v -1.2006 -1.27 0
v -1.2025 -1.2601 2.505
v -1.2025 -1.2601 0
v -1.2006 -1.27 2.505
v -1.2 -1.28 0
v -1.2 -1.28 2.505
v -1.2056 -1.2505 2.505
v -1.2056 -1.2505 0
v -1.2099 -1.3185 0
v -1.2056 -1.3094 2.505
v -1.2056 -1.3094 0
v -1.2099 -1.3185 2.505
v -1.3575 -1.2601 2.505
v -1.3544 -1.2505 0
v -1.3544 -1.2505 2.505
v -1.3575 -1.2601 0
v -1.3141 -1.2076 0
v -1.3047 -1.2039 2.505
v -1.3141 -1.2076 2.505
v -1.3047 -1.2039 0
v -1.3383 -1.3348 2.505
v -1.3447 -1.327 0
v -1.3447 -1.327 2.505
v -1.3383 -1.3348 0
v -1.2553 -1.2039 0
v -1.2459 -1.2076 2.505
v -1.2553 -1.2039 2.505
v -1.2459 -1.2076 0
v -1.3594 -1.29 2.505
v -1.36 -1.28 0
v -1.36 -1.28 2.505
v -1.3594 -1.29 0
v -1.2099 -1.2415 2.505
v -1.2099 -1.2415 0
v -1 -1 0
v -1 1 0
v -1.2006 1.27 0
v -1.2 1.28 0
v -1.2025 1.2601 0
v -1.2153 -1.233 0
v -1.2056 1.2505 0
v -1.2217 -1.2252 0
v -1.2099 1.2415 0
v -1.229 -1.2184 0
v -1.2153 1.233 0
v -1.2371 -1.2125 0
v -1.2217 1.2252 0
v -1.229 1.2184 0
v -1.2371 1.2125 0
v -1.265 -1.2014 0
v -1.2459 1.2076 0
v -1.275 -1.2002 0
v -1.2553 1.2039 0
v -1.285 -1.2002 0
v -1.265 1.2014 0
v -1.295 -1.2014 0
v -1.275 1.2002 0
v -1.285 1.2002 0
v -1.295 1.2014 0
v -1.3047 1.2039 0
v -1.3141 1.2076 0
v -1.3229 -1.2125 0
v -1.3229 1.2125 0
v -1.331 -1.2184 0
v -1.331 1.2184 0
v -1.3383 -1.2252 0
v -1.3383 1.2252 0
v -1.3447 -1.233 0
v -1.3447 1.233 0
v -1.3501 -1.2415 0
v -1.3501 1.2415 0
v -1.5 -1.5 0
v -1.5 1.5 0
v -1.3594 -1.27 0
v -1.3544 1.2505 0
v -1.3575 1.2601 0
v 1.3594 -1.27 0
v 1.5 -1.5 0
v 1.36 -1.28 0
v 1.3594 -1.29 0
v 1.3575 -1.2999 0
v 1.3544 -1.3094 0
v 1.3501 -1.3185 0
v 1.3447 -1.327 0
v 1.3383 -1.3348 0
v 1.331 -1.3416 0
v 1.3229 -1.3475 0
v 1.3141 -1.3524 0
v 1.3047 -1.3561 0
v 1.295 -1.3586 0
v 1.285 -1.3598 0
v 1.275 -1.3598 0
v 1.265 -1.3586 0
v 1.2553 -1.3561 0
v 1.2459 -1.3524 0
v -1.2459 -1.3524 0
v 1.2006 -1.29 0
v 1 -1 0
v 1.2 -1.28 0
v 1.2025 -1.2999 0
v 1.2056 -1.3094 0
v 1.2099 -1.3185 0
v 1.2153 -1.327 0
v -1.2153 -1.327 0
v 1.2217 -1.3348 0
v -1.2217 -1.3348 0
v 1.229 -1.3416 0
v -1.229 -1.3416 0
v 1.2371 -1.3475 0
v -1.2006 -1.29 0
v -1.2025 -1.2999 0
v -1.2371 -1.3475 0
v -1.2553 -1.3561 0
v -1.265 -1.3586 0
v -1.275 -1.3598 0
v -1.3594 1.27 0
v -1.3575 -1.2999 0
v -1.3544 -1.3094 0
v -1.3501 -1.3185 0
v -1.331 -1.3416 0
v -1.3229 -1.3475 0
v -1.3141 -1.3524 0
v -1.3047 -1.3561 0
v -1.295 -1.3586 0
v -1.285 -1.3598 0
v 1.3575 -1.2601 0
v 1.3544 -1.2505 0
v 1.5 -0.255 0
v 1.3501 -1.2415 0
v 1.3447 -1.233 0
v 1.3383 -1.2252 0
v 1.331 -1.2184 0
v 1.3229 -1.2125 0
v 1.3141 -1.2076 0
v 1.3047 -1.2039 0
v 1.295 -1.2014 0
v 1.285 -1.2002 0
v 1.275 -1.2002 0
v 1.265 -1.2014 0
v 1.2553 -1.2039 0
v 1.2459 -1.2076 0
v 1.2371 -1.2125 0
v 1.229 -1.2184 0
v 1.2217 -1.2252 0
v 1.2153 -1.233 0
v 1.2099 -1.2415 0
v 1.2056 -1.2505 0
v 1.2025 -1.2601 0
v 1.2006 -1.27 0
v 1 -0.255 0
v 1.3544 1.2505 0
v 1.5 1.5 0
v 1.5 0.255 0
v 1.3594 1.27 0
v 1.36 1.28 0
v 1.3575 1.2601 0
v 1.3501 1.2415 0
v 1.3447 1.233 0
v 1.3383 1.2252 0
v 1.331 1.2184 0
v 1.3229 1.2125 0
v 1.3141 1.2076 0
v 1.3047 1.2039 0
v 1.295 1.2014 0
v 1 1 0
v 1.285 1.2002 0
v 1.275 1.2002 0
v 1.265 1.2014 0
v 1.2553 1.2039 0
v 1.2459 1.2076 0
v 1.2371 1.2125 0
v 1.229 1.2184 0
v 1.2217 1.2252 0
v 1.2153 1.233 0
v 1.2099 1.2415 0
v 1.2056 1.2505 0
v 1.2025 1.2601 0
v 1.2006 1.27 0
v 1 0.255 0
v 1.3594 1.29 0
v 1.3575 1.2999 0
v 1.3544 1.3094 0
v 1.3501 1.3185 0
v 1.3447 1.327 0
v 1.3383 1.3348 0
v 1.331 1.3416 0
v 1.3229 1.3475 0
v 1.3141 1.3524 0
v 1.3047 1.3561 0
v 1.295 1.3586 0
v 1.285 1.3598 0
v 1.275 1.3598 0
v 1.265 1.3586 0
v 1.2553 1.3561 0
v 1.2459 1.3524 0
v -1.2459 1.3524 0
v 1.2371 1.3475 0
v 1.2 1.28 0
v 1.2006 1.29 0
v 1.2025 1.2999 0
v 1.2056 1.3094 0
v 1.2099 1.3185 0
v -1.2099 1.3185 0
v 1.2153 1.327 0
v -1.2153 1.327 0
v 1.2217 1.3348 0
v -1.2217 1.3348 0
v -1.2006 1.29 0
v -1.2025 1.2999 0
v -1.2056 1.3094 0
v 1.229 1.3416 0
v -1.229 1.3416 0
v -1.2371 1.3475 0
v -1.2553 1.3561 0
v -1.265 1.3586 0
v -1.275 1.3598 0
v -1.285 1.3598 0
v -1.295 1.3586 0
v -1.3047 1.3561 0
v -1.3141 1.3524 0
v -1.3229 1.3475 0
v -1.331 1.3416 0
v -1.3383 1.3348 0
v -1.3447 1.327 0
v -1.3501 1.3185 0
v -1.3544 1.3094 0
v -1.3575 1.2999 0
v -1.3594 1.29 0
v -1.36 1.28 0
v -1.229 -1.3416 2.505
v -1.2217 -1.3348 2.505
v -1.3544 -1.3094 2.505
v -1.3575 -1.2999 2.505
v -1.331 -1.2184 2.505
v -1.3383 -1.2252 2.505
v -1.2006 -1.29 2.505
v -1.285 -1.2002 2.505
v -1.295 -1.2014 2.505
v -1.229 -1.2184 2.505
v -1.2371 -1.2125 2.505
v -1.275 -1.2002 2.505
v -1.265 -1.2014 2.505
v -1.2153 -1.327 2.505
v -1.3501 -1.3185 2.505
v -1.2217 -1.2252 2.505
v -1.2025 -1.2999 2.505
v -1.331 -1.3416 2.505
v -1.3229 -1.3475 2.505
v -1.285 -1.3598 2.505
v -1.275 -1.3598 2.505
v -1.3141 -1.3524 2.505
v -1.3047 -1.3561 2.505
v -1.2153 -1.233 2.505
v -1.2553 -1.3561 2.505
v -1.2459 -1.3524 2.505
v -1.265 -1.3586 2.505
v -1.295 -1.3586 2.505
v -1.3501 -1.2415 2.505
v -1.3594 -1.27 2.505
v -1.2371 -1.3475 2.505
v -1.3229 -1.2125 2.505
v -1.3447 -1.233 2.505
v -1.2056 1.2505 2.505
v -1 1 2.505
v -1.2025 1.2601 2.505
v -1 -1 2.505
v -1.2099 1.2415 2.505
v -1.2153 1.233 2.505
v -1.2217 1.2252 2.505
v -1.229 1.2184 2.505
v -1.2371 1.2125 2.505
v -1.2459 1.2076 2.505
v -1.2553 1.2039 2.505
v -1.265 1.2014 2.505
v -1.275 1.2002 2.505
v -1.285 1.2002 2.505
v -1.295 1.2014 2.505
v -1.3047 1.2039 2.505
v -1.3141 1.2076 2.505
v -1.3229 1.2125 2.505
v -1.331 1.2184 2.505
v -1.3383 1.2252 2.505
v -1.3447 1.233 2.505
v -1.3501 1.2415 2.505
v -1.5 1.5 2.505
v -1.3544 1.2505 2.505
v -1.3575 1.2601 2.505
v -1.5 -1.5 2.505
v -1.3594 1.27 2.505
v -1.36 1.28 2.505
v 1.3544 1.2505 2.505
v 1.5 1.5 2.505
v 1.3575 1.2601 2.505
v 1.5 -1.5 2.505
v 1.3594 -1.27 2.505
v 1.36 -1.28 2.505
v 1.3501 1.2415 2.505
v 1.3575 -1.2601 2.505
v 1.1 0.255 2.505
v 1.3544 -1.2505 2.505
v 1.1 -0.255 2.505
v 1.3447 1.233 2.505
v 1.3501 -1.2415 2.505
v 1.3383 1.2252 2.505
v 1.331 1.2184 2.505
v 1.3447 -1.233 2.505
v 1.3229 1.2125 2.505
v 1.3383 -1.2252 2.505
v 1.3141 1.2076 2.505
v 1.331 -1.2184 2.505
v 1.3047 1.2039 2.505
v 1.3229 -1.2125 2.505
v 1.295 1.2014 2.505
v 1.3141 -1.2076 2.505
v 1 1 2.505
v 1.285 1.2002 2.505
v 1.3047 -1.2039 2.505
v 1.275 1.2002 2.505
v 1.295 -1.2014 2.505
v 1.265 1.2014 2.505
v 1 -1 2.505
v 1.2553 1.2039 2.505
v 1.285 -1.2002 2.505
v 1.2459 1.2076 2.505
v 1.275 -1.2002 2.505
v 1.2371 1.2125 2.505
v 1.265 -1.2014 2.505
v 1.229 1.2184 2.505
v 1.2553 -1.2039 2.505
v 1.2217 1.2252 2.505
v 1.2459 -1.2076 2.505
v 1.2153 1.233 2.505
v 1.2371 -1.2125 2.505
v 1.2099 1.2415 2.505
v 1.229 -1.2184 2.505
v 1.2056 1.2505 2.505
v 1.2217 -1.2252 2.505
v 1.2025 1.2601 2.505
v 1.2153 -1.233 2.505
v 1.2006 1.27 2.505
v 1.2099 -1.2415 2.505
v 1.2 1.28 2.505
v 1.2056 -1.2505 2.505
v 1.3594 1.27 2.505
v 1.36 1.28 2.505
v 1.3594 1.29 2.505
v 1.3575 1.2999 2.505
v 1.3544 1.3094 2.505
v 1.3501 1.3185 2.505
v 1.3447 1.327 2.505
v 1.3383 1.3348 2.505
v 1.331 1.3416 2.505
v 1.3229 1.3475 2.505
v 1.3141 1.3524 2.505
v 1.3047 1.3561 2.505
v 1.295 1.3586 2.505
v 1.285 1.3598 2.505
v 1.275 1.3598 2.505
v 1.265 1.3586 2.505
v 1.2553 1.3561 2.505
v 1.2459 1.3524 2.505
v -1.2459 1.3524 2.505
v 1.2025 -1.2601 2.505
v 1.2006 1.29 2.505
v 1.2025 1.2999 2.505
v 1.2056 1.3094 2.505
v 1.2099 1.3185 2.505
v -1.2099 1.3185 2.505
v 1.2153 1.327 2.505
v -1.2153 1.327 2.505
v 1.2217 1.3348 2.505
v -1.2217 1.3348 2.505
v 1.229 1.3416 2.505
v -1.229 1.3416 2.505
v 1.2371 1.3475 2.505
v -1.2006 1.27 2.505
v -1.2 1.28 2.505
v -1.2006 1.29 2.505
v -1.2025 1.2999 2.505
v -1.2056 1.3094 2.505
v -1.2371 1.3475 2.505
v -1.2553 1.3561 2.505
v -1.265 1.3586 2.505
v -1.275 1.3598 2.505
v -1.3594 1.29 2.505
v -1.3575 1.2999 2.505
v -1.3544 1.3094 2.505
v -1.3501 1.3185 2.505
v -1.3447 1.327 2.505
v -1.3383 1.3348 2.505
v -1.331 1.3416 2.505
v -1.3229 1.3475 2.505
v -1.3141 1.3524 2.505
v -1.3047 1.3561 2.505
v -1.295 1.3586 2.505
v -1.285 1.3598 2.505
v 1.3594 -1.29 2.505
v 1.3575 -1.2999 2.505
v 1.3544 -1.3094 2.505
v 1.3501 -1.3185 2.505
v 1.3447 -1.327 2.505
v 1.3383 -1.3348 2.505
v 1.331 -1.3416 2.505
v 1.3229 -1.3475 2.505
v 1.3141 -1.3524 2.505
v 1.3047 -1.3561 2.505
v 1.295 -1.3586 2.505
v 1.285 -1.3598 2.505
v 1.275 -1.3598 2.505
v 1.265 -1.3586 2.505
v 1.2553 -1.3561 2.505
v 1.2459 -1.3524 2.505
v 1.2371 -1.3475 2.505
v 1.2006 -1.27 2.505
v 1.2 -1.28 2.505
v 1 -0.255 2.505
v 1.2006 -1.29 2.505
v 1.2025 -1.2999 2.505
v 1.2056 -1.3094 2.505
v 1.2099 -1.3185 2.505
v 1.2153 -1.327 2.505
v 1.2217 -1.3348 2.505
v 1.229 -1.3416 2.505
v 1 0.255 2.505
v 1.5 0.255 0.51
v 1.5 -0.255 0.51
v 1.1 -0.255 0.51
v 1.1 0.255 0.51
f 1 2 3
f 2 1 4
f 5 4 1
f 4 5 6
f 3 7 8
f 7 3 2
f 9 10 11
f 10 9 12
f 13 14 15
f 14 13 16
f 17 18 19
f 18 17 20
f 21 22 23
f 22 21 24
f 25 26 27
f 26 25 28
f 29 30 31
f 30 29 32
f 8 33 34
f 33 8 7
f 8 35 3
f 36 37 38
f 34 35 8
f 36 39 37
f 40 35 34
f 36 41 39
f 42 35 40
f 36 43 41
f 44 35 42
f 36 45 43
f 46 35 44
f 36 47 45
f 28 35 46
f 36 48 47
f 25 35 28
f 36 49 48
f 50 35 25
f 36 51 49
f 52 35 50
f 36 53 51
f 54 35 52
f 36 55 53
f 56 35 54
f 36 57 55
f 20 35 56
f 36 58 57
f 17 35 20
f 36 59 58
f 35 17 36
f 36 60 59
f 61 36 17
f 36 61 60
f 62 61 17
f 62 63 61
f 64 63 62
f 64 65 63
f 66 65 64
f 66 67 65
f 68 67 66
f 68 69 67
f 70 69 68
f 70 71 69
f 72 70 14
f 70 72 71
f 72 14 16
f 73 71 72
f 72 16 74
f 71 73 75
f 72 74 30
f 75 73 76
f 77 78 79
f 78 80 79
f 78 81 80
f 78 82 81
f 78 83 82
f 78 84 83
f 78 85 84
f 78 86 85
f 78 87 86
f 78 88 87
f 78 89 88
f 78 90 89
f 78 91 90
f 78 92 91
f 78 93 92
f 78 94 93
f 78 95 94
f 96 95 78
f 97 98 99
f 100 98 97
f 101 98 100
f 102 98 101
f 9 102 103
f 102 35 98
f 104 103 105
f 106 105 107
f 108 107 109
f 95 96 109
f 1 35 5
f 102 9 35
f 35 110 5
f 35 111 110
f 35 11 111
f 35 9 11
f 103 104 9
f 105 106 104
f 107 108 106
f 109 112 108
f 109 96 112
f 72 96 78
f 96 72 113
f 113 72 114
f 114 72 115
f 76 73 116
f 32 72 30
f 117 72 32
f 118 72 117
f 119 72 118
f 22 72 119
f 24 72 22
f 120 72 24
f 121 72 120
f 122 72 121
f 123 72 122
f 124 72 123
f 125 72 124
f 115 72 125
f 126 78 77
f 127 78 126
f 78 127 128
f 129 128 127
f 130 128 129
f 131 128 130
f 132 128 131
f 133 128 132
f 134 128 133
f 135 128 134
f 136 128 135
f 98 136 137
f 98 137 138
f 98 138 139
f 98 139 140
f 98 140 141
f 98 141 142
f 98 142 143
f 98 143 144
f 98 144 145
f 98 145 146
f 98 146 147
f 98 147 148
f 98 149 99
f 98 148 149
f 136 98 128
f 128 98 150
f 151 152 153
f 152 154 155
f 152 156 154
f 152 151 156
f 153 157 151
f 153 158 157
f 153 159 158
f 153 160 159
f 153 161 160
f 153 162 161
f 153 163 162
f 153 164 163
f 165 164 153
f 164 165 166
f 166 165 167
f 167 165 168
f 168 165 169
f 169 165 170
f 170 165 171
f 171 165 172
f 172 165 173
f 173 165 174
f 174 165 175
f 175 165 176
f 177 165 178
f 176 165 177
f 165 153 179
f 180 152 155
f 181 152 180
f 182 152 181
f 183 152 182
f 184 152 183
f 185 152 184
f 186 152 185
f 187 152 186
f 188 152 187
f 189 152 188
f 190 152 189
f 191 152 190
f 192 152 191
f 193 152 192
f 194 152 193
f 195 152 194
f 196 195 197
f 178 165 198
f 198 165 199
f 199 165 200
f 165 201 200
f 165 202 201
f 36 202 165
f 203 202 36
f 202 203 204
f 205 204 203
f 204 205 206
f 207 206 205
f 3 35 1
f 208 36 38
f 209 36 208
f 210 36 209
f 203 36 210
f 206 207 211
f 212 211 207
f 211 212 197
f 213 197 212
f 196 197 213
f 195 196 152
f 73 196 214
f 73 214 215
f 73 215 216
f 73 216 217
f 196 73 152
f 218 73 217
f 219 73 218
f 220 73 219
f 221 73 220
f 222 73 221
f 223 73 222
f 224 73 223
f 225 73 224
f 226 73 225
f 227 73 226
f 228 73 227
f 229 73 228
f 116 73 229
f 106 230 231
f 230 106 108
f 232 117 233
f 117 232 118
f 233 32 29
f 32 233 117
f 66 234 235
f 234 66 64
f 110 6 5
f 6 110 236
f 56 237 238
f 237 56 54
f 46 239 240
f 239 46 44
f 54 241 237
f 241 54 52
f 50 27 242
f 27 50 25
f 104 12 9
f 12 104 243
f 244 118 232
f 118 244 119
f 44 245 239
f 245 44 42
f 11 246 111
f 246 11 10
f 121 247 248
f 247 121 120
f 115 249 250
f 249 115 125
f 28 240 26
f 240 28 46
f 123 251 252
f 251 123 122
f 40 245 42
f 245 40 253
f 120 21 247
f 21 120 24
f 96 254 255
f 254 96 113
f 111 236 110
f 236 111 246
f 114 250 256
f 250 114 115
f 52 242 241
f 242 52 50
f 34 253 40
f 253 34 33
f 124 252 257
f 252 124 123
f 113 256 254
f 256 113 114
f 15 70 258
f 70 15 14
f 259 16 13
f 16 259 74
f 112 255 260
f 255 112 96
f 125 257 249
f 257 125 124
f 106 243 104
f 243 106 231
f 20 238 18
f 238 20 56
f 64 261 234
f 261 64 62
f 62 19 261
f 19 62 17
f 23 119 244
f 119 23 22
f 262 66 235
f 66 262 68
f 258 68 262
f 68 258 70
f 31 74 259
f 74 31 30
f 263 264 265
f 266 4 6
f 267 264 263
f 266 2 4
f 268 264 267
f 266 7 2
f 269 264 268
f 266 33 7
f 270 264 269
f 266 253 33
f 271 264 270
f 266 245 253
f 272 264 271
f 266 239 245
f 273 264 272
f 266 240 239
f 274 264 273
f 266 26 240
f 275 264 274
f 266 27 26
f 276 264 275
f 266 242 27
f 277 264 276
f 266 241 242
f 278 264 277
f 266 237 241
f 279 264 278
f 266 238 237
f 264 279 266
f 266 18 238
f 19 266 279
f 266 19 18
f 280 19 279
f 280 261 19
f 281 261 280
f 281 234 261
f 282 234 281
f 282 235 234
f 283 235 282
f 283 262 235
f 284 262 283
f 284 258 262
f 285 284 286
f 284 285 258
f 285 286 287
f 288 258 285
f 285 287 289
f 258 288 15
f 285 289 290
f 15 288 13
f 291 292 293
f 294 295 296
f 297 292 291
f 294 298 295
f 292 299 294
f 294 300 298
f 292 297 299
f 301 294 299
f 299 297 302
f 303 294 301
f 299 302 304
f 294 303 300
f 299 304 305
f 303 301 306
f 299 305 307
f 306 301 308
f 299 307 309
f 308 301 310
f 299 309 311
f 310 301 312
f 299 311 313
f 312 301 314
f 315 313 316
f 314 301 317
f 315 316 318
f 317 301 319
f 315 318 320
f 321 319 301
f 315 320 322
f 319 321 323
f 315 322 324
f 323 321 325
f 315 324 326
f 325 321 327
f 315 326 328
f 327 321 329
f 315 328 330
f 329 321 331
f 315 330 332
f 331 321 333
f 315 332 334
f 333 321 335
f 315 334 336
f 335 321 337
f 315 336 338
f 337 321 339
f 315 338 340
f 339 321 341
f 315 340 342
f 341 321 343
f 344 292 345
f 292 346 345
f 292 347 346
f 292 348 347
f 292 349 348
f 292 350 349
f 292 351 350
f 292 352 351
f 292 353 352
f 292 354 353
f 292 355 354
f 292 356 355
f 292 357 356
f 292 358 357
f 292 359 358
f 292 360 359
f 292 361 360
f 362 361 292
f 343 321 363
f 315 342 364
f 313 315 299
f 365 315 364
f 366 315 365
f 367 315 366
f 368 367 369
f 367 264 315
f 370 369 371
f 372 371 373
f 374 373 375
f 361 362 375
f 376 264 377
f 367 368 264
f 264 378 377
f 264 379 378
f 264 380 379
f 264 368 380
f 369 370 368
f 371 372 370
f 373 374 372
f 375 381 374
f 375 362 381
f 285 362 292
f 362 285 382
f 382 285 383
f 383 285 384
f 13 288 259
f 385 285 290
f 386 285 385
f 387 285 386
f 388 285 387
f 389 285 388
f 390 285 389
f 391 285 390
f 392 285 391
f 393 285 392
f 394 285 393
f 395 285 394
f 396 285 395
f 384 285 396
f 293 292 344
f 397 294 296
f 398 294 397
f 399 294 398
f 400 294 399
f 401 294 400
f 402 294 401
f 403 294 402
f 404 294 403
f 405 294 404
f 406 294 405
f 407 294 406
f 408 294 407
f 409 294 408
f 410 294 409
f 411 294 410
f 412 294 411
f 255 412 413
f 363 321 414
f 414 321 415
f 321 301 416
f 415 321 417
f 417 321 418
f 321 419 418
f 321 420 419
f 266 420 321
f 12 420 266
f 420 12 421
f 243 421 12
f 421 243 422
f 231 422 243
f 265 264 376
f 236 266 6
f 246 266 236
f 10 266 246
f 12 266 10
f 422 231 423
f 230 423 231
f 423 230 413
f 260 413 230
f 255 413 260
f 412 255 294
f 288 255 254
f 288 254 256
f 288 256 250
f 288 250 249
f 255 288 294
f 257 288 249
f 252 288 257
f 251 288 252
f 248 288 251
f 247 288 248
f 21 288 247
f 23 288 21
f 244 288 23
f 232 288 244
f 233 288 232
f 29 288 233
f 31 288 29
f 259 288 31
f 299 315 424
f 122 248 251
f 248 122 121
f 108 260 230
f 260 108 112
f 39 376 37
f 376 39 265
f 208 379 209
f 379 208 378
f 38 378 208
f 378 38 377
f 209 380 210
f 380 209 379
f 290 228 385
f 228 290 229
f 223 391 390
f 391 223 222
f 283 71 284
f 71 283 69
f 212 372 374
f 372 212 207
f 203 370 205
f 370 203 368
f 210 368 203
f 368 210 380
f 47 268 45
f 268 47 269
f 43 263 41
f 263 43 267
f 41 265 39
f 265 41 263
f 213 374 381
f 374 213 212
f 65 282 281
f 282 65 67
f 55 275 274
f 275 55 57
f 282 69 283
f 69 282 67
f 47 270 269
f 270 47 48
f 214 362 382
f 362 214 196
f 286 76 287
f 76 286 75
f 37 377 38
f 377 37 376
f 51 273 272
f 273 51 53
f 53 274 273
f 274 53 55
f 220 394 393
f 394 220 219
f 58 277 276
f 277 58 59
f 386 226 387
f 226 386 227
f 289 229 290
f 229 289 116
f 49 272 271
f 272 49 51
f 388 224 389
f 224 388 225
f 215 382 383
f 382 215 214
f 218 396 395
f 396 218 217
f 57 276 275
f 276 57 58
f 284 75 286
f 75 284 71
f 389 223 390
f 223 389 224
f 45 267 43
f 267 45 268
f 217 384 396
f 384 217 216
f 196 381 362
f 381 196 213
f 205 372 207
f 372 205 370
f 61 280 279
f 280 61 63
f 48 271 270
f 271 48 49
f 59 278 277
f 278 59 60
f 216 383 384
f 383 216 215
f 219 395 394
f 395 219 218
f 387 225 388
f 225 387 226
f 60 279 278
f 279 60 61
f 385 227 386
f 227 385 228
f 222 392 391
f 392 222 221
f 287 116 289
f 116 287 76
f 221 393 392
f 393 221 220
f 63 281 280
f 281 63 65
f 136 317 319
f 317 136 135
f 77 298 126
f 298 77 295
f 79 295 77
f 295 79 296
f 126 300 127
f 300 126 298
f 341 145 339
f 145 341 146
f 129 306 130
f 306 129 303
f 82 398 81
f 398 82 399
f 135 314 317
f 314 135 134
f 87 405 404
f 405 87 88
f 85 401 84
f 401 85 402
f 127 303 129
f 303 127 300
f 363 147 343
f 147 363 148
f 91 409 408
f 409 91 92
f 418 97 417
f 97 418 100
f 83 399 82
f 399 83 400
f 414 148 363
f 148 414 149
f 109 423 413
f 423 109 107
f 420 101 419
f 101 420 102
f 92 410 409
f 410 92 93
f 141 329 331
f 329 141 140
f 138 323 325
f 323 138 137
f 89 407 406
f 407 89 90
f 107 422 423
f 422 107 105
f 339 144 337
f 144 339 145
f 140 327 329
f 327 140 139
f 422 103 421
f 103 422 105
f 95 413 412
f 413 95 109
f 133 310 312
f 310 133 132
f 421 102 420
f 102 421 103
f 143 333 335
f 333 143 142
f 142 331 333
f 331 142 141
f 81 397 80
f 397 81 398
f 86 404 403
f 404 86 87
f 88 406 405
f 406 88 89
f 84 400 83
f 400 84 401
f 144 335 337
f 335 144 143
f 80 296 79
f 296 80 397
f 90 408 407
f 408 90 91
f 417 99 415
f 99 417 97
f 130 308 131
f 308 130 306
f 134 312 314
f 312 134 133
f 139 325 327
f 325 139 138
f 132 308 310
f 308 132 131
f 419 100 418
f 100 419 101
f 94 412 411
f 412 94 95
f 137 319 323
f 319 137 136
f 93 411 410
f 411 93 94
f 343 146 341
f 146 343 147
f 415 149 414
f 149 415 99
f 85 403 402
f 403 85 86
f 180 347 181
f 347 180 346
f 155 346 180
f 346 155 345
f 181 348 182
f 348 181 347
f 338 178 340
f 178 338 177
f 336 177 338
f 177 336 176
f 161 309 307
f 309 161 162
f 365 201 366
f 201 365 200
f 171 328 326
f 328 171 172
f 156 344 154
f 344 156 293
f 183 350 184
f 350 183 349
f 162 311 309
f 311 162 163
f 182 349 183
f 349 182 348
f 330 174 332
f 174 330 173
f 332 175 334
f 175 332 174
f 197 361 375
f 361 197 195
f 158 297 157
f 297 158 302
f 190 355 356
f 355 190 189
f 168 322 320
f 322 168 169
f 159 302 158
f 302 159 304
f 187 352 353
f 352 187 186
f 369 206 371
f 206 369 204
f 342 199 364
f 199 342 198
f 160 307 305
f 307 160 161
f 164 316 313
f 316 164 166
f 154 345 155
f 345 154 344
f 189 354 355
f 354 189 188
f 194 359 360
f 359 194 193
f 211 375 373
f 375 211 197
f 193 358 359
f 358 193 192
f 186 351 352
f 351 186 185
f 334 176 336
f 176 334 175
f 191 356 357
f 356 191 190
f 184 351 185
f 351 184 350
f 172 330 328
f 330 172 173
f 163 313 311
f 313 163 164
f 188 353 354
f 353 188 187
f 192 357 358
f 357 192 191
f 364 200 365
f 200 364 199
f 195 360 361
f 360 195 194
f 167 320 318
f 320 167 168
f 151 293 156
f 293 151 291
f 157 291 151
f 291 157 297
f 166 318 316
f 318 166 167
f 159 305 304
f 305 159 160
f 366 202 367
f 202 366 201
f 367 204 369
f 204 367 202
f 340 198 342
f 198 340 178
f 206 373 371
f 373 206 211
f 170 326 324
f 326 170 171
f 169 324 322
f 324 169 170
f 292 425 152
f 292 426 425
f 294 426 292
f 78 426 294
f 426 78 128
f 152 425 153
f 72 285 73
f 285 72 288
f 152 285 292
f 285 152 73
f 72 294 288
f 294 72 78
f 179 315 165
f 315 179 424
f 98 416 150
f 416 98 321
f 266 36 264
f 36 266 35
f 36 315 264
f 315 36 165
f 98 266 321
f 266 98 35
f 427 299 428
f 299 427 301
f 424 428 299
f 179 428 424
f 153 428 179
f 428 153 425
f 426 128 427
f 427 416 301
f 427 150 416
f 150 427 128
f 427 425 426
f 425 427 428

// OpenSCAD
//Written by Ryan Branch on 7/8/2017
//Default values are listed in inches

//Special variables:
$fn = 50;

//User-defined parameters:
    //TURNTABLE SPECIFICATIONS
    turntable_width = 3.000;
    turntable_thickness = 0.390;
    turntable_top_hole_spacing = 2.560;
    turntable_top_hole_diameter = 0.160;
    turntable_bottom_hole_spacing = 2.560;
    turntable_bottom_hole_diameter = 0.160;
    turntable_central_hole_diameter = 2.710;
    //MOTOR SPECIFICATIONS
    motor_width = 1.700;
    motor_body_height = 1.950;
    motor_raised_circle_height = 0.090;
    motor_raised_circle_diameter = 0.880;
    motor_hole_spacing = 1.220;
    motor_hole_diameter = 0.160;
    motor_shaft_length = 0.945;
    motor_shaft_diameter = 0.208;
	motor_wire_exit_width = 0.510;
    motor_wire_exit_height = 0.510;
    //Thickness of extra space for sliding wire between motor wall and part wall
    motor_wire_clearance_width = 0.250;
    //The distance above the motor face plate that any component sticks out
    motor_clearance_height = 0.2;
    //FASTENER SPECIFICATIONS
    outside_bottom_nut_thickness = 0.080;
    outside_bottom_nut_largest_diameter = 0.270;
    inside_bottom_nut_thickness = 0.080;
    inside_bottom_nut_largest_diameter = 0.270;
    top_nut_thickness = 0.080;
    top_nut_largest_diameter = 0.270;

//Writer-defined parameters:
    //BOTTOM PARAMETERS
    
    //LOWER BRACKET PARAMETERS
    //horizontal thicknesses
    hthick_lower_bracket_walls = 0.500;
    
    //UPPER BRACKET PARAMETERS
    //vertical thicknesses
    vthick_bottom_plate = 0.250;
    vthick_upper_bracket_plate = 0.125;
    vthick_top_plate = 0.250;
    vthick_space_below_coupler = 0.100;
    //"below" refers to after the part has been flipped over 180 degrees
    vthick_below_vents = 0.250;
    //horizontal thicknesses
    hthick_shaft_coupler_ring = 0.125;
    hthick_shaft_coupler_panel = 0.100;
    hthick_shaft_coupler_gap = 0.03;
    //other
    shaft_coupler_panel_length = 0.300;
    shaft_coupler_hole_diameter = 0.160;
    
    //TOP PARAMETERS

//Part 2: Lower Bracket
// - This part is connected to the Bottom Plate as well as the
//    turntable bottom holes via the outside holes
// - This part should be turned upside-down in a slicer before GCODE is exported

//Preliminary calculation of part height
lowerBracketHeight = motor_body_height + motor_shaft_length - turntable_thickness;

difference() {
    //The height of the bracket's lower portion is
    //equal to the length of the motor's body.
    //It's created horizontally centered but vertically at 0
    translate([0,0,(lowerBracketHeight / 2)]) {
        cube([turntable_width, turntable_width, lowerBracketHeight], true);
    }
    
    //Holes which are subtracted from the lower portion
    for(xMultiplier = [-1:2:1]) {
        for(yMultiplier = [-1:2:1]) {
            //Holes for attaching to Bottom Plate
            translate([(xMultiplier * (turntable_bottom_hole_spacing / 2)),
                       (yMultiplier * (turntable_bottom_hole_spacing / 2)),
                       0]) {
                cylinder(lowerBracketHeight,
                         (turntable_bottom_hole_diameter / 2),
                         (turntable_bottom_hole_diameter / 2));
            }
            
        }
    }
    //Rectangular space which will be occupied by the motor body
    translate([0,0,(lowerBracketHeight / 2)]) {
        cube([turntable_width - hthick_lower_bracket_walls * 2,
              turntable_width - hthick_lower_bracket_walls * 2,
              lowerBracketHeight], true);
    }
    //Shaft to slide stepper wires in during installation
    //Assumes the wires can be bent downward to lead below the motor as
    //the motor is inserted into the part from above
    translate([(motor_width + motor_wire_clearance_width) / 2,
               0,
               (lowerBracketHeight / 2)]) {
        cube([motor_wire_clearance_width, motor_wire_exit_width, lowerBracketHeight], true);
    }
    //Rectangular space through which stepper wires run after installation
    //Assumes the wires protrude from a side face of the motor,
    //  located at the bottom vertically and the center horizontally
    translate([(turntable_width / 4),0,(motor_wire_exit_height / 2)]) {
        cube([(turntable_width / 2),
              motor_wire_exit_width, 
              motor_wire_exit_height], true);
    }
}	// difference()
